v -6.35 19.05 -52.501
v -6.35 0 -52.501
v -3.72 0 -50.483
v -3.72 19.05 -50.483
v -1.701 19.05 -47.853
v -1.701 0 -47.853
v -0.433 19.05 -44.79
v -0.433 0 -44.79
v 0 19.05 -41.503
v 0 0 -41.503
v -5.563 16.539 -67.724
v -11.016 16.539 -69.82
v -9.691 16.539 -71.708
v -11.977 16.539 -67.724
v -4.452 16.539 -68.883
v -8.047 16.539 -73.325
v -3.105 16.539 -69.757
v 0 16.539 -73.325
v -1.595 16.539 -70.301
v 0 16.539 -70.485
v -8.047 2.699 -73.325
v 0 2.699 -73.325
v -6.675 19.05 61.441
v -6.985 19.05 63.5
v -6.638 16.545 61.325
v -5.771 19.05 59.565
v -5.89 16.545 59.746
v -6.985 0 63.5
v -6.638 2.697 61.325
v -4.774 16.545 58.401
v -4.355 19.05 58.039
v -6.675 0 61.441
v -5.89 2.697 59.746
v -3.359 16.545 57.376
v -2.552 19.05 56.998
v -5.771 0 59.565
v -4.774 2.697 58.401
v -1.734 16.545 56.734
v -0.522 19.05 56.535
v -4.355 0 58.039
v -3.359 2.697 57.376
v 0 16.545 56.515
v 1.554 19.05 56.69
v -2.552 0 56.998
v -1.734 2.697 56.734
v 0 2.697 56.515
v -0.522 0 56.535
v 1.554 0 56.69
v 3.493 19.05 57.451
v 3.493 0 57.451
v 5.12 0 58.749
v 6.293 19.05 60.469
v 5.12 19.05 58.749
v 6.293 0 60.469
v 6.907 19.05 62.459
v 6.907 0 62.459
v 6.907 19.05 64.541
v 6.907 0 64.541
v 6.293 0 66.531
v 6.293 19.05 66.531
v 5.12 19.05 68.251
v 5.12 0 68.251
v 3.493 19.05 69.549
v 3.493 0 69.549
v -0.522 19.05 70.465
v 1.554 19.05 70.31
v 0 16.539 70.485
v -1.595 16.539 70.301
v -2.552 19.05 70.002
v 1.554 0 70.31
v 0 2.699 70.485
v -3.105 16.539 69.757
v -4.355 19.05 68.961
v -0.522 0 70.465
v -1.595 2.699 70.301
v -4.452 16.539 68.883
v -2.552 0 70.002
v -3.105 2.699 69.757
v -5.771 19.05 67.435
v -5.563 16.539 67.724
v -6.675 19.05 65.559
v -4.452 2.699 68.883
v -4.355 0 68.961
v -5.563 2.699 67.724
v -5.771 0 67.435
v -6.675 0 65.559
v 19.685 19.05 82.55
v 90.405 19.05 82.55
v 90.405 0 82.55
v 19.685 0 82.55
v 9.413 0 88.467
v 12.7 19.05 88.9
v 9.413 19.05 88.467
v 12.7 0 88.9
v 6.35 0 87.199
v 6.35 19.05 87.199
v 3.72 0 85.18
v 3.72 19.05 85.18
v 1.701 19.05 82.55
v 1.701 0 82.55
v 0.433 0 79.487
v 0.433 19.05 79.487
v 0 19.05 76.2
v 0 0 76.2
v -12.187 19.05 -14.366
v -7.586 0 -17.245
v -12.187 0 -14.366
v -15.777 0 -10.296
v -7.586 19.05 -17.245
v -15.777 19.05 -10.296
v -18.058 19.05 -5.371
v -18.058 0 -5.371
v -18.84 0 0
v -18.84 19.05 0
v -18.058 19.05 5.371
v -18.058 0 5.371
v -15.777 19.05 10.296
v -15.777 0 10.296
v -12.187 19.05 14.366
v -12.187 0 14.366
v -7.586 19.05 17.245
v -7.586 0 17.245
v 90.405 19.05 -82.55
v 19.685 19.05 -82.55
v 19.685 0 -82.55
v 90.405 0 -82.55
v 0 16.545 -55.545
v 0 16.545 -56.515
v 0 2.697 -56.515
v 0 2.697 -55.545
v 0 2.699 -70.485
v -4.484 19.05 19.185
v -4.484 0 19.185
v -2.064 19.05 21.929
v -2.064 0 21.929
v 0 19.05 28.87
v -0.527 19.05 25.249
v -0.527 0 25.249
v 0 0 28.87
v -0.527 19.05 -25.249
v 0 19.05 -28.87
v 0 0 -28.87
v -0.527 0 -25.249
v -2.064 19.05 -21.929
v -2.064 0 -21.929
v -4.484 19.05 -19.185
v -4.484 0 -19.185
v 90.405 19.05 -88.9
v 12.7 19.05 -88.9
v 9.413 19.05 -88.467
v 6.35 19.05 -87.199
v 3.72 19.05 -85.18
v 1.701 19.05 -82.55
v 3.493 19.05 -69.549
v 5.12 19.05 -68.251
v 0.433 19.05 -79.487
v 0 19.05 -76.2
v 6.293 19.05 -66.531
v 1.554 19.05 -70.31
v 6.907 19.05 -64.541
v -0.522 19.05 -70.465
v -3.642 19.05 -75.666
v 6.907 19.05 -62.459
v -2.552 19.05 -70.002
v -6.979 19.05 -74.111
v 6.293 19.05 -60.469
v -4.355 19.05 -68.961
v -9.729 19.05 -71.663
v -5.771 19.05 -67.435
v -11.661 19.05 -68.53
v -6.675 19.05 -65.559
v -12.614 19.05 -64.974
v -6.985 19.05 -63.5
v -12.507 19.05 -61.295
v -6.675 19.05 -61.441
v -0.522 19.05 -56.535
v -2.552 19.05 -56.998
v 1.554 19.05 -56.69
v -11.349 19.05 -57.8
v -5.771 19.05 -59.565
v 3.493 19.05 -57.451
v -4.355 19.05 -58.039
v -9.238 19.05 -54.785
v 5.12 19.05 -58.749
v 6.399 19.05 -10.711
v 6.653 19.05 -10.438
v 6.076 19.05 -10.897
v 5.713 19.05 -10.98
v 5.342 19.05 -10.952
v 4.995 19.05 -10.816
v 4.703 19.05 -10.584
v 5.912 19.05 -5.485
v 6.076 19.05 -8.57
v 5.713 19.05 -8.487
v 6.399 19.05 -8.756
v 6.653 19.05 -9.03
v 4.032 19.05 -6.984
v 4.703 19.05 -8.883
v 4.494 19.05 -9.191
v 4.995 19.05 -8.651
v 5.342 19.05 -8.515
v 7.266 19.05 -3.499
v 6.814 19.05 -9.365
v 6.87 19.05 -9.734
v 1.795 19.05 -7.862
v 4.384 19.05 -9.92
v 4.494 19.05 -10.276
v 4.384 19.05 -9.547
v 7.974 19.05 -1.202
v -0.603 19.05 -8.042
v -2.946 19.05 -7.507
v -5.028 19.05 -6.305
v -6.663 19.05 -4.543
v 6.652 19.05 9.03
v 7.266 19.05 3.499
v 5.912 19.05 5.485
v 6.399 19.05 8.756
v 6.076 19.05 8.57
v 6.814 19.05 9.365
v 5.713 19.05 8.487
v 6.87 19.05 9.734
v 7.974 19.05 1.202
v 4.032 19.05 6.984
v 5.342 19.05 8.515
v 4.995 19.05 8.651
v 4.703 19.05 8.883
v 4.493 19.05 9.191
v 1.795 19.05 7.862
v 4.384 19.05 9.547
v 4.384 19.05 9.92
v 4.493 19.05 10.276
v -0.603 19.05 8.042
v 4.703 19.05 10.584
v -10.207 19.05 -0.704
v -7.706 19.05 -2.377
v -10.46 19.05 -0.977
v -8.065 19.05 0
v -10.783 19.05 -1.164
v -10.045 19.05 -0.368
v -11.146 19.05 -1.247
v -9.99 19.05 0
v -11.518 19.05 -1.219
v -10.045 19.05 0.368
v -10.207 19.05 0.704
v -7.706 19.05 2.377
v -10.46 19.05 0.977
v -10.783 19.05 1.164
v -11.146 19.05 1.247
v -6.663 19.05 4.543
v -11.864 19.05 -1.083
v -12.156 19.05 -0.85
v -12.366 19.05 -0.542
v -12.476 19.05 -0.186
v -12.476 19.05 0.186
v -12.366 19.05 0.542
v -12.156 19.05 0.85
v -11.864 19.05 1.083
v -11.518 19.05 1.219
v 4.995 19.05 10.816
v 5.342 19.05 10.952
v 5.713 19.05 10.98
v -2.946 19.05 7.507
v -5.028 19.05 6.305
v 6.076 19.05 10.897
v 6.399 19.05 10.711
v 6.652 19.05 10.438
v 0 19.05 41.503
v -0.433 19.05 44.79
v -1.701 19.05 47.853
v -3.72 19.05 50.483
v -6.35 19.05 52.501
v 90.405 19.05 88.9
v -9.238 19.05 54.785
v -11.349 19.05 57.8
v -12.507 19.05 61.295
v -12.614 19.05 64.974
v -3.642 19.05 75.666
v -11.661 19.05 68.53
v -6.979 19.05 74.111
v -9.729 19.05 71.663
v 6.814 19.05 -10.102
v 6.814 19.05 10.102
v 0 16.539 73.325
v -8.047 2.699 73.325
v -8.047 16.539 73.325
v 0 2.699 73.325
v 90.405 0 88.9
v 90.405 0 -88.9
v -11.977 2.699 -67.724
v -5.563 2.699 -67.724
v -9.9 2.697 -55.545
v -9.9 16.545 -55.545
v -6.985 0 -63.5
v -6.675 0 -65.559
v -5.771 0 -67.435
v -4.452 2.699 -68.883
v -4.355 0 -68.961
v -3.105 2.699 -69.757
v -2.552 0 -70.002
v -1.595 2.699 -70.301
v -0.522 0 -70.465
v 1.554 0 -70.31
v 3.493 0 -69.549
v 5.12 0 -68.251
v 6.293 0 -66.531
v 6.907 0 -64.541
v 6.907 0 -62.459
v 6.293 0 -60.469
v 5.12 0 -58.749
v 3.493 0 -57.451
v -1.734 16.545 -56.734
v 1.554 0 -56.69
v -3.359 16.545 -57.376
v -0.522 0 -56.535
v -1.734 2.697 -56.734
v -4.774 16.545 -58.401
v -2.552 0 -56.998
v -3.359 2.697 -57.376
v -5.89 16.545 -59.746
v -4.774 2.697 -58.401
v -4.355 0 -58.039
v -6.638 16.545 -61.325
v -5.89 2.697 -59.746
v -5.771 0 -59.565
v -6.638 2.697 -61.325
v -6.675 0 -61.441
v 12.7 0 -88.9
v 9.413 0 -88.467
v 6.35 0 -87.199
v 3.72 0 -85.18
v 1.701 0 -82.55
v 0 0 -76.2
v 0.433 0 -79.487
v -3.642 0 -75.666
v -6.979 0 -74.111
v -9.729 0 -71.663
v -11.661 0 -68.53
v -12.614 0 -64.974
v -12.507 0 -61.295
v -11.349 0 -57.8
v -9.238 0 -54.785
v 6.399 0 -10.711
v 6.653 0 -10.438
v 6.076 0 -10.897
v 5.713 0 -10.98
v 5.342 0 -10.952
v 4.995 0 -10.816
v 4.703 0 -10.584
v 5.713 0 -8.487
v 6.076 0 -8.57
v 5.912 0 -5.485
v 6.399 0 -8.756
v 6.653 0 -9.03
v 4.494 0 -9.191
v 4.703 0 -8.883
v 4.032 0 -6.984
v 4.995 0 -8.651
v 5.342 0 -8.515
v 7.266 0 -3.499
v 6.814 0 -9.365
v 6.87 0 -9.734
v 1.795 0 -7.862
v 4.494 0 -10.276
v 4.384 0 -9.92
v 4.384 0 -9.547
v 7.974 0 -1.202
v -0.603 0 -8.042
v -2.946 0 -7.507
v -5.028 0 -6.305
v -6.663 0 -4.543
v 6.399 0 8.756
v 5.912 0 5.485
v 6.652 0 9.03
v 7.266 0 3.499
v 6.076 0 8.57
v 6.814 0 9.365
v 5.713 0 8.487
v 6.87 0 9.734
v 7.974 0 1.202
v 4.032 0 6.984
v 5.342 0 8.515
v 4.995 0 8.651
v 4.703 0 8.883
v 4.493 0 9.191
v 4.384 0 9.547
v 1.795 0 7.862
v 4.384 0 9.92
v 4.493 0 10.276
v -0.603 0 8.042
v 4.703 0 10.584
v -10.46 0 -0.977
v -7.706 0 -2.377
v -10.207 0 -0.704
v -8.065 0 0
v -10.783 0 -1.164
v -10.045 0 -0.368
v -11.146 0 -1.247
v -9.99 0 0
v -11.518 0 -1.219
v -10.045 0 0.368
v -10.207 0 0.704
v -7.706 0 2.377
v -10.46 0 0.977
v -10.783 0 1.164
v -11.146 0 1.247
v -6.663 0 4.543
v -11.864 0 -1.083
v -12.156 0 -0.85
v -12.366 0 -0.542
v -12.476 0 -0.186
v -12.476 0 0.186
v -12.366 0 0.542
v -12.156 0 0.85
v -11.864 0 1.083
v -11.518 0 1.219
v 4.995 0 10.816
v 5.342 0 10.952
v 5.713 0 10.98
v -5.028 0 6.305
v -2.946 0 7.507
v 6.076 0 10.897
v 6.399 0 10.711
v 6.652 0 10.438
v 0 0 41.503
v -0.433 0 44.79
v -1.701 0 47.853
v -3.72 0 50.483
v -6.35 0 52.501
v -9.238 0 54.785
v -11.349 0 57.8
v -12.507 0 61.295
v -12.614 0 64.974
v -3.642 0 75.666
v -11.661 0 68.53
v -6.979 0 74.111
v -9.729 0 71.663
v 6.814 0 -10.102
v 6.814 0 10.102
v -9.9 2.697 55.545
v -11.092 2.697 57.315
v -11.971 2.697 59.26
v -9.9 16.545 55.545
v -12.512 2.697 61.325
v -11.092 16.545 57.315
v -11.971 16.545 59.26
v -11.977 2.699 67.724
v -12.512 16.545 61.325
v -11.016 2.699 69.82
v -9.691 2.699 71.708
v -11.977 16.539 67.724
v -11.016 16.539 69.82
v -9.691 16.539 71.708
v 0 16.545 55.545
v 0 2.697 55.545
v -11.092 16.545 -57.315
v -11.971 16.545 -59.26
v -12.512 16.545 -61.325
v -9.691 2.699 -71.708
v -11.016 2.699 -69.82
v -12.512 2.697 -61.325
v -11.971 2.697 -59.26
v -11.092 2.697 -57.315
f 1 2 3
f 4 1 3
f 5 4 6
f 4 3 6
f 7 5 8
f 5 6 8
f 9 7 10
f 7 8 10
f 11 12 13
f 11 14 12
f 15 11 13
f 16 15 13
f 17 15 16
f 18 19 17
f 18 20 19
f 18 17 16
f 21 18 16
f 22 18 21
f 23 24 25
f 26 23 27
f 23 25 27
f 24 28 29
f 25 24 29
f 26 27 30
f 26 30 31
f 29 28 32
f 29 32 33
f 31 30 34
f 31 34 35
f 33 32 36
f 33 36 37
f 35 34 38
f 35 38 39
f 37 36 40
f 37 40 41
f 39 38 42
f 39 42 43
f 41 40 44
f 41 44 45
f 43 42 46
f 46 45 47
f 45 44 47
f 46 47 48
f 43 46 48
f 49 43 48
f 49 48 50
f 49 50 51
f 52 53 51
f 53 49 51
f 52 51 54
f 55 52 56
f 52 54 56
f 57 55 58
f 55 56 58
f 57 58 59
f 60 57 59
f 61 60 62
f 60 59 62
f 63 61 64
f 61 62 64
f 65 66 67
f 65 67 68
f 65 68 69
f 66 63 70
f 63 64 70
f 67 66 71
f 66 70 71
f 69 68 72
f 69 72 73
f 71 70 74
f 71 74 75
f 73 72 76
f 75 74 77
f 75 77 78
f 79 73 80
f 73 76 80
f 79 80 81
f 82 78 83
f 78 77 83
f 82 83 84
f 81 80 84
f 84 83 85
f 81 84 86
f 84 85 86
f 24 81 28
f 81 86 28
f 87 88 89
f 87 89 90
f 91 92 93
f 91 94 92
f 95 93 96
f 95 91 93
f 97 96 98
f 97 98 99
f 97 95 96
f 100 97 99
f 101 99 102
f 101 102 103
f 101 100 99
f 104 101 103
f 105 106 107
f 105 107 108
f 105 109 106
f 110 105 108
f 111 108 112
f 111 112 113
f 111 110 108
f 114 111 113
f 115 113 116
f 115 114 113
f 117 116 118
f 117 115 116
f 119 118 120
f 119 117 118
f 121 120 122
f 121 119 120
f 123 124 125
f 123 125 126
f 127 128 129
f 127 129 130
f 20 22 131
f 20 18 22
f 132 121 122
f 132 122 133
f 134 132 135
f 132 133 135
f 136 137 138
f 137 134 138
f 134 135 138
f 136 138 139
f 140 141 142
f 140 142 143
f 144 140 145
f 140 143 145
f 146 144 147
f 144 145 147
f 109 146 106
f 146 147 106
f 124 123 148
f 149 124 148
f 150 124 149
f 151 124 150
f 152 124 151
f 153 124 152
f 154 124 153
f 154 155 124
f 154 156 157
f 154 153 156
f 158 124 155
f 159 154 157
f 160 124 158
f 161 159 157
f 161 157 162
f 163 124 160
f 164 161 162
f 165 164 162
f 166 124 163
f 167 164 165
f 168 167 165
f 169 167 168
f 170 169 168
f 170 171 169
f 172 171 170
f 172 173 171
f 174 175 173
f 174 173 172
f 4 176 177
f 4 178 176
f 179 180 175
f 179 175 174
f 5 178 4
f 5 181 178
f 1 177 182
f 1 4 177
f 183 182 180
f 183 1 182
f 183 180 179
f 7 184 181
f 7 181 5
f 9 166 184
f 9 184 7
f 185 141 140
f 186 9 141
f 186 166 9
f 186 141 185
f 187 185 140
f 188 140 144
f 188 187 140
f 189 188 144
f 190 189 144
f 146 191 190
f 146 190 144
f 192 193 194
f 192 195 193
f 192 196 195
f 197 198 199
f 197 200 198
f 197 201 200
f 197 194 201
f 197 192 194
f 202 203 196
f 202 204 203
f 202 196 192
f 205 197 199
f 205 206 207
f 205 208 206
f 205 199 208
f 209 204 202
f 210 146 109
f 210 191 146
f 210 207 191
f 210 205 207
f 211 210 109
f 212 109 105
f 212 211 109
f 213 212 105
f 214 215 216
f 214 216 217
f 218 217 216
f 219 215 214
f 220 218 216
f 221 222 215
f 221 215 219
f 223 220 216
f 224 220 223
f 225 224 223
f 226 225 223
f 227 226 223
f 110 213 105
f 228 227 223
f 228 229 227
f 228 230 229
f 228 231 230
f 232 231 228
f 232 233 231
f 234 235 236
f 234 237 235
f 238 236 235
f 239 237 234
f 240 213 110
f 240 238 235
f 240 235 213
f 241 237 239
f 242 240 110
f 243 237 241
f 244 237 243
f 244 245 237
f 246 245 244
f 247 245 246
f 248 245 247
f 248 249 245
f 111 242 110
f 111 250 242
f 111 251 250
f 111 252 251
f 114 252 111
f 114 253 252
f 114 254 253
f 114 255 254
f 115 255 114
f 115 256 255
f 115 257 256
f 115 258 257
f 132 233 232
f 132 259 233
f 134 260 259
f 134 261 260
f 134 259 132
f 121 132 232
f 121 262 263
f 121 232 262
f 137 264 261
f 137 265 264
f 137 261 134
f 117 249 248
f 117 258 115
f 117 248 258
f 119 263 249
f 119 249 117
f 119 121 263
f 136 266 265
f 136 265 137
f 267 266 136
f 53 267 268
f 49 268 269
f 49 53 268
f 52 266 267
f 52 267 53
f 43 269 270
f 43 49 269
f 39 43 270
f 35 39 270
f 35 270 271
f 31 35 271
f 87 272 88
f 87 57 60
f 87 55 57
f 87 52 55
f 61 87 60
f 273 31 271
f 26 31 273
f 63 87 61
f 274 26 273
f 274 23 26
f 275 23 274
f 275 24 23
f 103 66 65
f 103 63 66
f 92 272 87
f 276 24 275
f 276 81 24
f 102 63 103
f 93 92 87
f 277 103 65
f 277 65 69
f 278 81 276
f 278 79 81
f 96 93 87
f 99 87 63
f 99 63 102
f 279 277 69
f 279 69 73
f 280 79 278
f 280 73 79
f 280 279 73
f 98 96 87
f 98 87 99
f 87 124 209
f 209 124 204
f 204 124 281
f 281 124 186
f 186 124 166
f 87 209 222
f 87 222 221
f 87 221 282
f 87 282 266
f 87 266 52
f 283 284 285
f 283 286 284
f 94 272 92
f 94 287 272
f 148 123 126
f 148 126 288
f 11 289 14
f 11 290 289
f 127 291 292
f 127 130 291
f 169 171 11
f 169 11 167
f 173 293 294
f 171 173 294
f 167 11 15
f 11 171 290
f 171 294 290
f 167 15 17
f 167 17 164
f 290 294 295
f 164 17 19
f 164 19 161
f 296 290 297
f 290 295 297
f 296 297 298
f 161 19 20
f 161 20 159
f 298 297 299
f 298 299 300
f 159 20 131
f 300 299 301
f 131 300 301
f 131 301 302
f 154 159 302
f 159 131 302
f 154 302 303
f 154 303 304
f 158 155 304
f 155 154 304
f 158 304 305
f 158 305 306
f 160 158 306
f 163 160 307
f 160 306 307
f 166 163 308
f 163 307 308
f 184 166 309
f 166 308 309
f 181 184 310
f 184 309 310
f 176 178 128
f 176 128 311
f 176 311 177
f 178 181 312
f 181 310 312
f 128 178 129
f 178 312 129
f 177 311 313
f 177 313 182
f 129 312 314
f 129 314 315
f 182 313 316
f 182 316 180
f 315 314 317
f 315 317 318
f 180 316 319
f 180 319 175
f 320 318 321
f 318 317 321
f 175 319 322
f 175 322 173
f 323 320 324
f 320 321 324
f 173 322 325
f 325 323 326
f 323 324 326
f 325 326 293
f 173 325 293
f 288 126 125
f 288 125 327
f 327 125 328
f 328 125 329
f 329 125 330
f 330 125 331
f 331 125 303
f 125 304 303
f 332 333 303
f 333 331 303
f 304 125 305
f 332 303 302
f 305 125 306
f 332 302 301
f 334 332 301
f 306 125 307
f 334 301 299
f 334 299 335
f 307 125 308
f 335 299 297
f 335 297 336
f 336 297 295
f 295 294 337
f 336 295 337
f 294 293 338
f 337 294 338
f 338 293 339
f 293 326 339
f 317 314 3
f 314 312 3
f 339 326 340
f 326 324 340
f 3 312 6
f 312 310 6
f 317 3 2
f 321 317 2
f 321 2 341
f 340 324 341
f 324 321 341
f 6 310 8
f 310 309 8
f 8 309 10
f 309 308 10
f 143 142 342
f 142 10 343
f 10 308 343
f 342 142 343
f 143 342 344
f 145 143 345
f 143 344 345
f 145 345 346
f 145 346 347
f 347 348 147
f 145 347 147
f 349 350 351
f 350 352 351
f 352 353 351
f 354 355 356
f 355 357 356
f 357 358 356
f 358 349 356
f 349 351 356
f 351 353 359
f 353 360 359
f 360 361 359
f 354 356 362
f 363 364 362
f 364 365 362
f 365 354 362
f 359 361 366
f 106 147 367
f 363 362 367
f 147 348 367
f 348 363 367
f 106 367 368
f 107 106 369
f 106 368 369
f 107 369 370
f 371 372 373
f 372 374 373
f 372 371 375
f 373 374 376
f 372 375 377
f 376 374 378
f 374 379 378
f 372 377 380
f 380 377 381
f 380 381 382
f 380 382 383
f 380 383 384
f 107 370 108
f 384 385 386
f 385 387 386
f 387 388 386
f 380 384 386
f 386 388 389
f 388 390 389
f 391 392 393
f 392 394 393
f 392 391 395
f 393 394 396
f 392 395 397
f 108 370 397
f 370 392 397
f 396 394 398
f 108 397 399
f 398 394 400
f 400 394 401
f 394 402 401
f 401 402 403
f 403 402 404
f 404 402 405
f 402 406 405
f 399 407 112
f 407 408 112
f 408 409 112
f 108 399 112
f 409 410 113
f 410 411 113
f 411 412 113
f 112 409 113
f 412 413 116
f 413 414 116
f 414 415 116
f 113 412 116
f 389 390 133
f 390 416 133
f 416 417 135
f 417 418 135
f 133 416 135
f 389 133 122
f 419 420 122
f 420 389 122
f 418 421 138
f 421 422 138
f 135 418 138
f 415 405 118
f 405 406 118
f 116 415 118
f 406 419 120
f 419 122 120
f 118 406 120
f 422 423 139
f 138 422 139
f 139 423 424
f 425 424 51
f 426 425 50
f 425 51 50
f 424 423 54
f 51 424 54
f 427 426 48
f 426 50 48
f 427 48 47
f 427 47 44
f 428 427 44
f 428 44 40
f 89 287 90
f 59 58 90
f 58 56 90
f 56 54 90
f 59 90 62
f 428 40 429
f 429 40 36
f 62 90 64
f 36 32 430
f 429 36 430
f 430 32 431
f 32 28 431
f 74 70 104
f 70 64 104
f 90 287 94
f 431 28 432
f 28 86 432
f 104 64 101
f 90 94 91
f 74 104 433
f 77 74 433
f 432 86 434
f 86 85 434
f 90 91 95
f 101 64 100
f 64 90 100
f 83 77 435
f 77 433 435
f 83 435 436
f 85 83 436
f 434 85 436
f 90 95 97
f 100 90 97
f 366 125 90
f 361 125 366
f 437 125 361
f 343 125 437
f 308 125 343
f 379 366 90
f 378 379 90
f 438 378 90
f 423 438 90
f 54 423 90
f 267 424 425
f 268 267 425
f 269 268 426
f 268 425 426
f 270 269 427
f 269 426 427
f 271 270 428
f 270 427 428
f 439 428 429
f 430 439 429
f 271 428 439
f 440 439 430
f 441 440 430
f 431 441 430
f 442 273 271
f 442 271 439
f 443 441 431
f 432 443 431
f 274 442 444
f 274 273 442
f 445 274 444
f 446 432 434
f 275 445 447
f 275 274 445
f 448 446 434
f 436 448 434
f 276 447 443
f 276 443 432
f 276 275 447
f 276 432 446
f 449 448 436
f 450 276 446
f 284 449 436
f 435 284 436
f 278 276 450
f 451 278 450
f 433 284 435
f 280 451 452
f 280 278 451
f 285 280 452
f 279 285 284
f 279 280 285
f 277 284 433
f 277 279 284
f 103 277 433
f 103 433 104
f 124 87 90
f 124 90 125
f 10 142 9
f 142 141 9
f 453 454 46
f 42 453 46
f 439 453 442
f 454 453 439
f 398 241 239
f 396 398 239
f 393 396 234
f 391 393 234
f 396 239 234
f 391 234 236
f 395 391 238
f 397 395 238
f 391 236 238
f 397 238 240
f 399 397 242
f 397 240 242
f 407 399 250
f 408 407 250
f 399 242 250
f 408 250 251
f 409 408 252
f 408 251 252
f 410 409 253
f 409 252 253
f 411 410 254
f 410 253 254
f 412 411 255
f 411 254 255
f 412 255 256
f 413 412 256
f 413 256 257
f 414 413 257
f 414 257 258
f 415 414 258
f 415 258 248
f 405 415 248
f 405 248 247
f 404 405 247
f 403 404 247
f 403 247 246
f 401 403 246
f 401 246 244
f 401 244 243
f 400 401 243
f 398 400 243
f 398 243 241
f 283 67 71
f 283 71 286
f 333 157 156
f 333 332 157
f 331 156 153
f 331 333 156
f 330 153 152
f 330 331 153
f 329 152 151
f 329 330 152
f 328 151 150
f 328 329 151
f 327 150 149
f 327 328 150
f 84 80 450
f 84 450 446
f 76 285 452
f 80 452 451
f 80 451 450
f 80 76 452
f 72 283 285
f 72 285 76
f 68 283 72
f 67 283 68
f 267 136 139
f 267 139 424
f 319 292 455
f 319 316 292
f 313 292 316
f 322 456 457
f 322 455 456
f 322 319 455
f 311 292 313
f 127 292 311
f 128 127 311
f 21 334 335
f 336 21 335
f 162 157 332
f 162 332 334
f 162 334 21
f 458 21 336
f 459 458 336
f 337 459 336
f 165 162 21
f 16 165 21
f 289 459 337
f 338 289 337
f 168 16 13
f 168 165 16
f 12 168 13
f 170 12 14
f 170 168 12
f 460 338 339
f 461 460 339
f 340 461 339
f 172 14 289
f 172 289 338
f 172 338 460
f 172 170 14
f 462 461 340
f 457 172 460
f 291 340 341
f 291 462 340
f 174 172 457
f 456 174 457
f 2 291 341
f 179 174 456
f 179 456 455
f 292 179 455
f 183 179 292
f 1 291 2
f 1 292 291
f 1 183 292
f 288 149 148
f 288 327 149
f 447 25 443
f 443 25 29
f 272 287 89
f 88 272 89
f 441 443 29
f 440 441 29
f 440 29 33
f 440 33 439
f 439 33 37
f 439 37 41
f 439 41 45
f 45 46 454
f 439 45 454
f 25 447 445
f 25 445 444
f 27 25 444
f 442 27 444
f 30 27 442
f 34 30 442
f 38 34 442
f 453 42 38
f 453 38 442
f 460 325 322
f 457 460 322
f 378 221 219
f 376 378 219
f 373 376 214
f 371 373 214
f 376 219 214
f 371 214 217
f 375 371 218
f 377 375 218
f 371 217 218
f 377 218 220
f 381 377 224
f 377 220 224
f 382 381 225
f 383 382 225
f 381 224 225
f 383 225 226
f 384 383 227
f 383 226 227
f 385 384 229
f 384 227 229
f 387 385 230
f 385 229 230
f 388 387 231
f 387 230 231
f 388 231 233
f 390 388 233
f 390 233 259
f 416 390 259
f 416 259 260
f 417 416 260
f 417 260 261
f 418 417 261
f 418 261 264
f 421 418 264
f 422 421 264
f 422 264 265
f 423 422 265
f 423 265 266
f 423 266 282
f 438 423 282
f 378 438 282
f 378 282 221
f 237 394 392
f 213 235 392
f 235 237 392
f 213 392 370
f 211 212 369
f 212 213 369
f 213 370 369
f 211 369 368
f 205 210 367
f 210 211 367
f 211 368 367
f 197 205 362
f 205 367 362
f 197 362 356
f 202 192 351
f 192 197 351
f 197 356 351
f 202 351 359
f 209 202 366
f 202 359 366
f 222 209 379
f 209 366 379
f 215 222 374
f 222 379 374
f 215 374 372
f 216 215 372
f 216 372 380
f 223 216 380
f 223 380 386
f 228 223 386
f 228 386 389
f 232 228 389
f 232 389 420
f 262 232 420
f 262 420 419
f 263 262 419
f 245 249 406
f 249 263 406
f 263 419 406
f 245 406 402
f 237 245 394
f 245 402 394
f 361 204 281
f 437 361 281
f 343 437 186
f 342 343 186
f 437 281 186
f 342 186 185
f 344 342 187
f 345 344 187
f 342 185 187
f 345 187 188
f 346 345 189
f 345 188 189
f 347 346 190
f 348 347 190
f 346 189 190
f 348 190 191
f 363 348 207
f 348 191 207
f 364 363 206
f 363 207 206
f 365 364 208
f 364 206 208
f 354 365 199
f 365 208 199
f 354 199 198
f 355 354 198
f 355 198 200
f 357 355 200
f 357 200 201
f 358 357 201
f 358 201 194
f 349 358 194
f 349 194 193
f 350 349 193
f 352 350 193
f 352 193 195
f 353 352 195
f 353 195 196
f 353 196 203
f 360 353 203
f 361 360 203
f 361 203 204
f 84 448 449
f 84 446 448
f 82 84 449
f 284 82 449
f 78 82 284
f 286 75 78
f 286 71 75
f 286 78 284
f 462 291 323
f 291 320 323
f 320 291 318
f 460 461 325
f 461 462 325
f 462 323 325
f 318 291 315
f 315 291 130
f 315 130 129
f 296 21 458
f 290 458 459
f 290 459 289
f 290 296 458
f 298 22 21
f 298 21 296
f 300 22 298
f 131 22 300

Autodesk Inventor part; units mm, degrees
ref_plane "YZ Plane" through (0, 0, 0) normal (1, 0, 0) x (0, 1, 0)
sketch "Sketch1" plane through (0, 0, 0) normal (0, 1, 0) x (-1, 0, 0)
  circle A0 centre (0, 0) radius 8.0645
  circle A1 centre (0, -63.5) radius 6.985
  circle A2 centre (0, 63.5) radius 6.985
  line L0 (-39.6048, 88.9) -> (39.6048, 88.9)
  line L1 (39.6048, 88.9) -> (39.6048, -88.9)
  line L2 (39.6048, -88.9) -> (-39.6048, -88.9)
  line L3 (-39.6048, -88.9) -> (-39.6048, 88.9)
  line L4 (-39.6048, 88.9) -> (39.6048, -88.9) construction
  line L5 (39.6048, 88.9) -> (-39.6048, -88.9) construction
  line L6 (10.9754, 63.5) -> (10.9754, 0) construction
  point P0 (0, 0)
  point P1 (0, 0)
  point P2 (0, 63.5)
  dimension "d0" = 16.129
  dimension "d1" = 13.97
  dimension "d2" = 13.97
  dimension "d28" = 177.8
  dimension "d30" = 25.4
  dimension "d31" = 25.4
extrude "Extrusion4" add sketch "Sketch1" along normal blind 19.05
ref_plane "Work Plane2" through (0, 19.05, 0) normal (0, 1, 0) x (1, 0, 0)
sketch "Sketch2" plane through (0, 19.05, 0) normal (0, 1, 0) x (1, 0, 0)
  circle A0 centre (-11.2395, 0) radius 1.25
  circle A1 centre (0, 0) radius 7.94 projected
  circle A2 centre (5.6197, -9.7337) radius 1.25
  circle A3 centre (5.6198, 9.7337) radius 1.25
  dimension "d11" = 2.5
  dimension "d12" = 11.2395
  dimension "d15" = 360
ref_plane "Work Plane1" through (0, 19.05, 0) normal (0, 1, 0) x (1, 0, 0)
extrude "Extrusion5" cut sketch "Sketch2" against normal up to next contours A0 | A2 | A3
sketch "Sketch6" plane through (0, 19.05, 0) normal (0, 1, 0) x (1, 0, 0)
  line L0 (0, -38.1) -> (0, -18.8395)
  line L1 (0, 18.8395) -> (0, 38.1)
  line L2 (39.6048, 88.9) -> (-39.6048, 88.9) projected
  line L3 (0, 88.9) -> (-39.6048, 88.9)
  line L4 (-39.6048, -88.9) -> (39.6048, -88.9) projected
  line L5 (-39.6048, 88.9) -> (-39.6048, -88.9)
  line L6 (-39.6048, -88.9) -> (0, -88.9)
  circle A0 centre (0, 0) radius 8.0645 projected
  arc A1 (0, 18.8395) -> (0, -18.8395) centre (0, 0) ccw
  arc A2 (0, -50.8) -> (0, -76.2) centre (0, -63.5) ccw
  line L7 (0, -38.1) -> (0, -50.8)
  line L8 (0, -76.2) -> (0, -88.9)
  arc A3 (0, 76.2) -> (0, 50.8) centre (0, 63.5) ccw
  line L9 (0, 88.9) -> (0, 76.2)
  line L10 (0, 50.8) -> (0, 38.1)
  circle A4 centre (0, 63.5) radius 6.477
  circle A5 centre (0, -63.5) radius 6.477
  circle A6 centre (-11.2395, 0) radius 1.25 projected
  point P0 (0, 0)
  dimension "d41" = 25.4
  dimension "d42" = 25.4
  dimension "d44" = 12.954
  dimension "d45" = 12.954
  dimension "d77" = 6.35
extrude "Extrusion6" cut sketch "Sketch6" against normal blind 19.05 contours L7 A2 L8 L4 L5 L2 L9 A3 L10 L1 A1 L0
fillet "Fillet5" radius 12.7 4 edges at (0, 9.525, 50.8) (0, 9.525, -50.8) (0, 9.525, -18.8395) (0, 9.525, 18.8395)
sketch "Sketch8" plane through (0, 19.05, -88.9) normal (-1, 0, 0) x (0, 0, 1)
  line L0 (33.355, -16.3528) -> (33.355, -2.5052) projected
  line L1 (15.575, -2.511) -> (15.575, -16.351) projected
  line L2 (27.5747, -16.3528) -> (27.5747, -2.5052)
  line L3 (21.1759, -16.351) -> (21.1759, -2.511)
  line L4 (33.355, -16.3528) -> (27.5747, -16.3528)
  line L5 (33.355, -2.5052) -> (27.5747, -2.5052)
  line L6 (15.575, -16.351) -> (21.1759, -16.351)
  line L7 (21.1759, -2.511) -> (15.575, -2.511)
  point P0 (88.9, -19.05)
extrude "Extrusion7" cut sketch "Sketch8" along normal up to next
mirror "Mirror1" about plane through (0, 0, 0) normal (0, 0, 1) of "Extrusion7"
fillet "Fillet6" radius 12.7 2 edges at (0, 9.525, 88.9) (0, 9.525, -88.9)
sketch "Sketch12" plane through (0, 19.05, 0) normal (0, 1, 0) x (1, 0, 0)
  line L0 (39.6048, -88.9) -> (39.6048, 88.9) projected
  line L1 (39.6048, -82.55) -> (19.685, -82.55)
  line L2 (19.685, -82.55) -> (19.685, 82.55)
  line L3 (19.685, 82.55) -> (39.6048, 82.55)
  line L4 (39.6048, 82.55) -> (39.6048, -82.55)
  line L5 (39.6048, 88.9) -> (12.7, 88.9) projected
  line L6 (12.7, -88.9) -> (39.6048, -88.9) projected
  circle A0 centre (0, -63.5) radius 6.985 projected
  point P0 (0, 0)
  dimension "d72" = 6.35
  dimension "d73" = 6.35
  dimension "d74" = 12.7
extrude "Extrusion10" cut sketch "Sketch12" against normal up to next contours L1 L2 L3 L0
sketch "Sketch13" plane through (39.6048, 0, 88.9) normal (1, 0, 0) x (0, 0, -1)
  line L0 (0, 0) -> (0, 19.05) projected
  line L1 (171.45, 0) -> (6.35, 0) projected
  line L2 (0, 19.05) -> (6.35, 19.05)
  line L3 (6.35, 19.05) -> (6.35, 0)
  line L4 (6.35, 0) -> (0, 0)
  line L5 (0, 0) -> (0, 19.05)
  line L6 (171.45, 19.05) -> (171.45, 0) projected
  line L7 (177.8, 19.05) -> (177.8, 0) projected
  line L8 (171.45, 19.05) -> (177.8, 19.05)
  line L9 (177.8, 19.05) -> (177.8, 0)
  line L10 (177.8, 0) -> (171.45, 0)
  line L11 (171.45, 0) -> (171.45, 19.05)
  point P0 (88.9, 0)
extrude "Extrusion11" add sketch "Sketch13" along normal blind 50.8
properties part number "AlteredPlatform"
